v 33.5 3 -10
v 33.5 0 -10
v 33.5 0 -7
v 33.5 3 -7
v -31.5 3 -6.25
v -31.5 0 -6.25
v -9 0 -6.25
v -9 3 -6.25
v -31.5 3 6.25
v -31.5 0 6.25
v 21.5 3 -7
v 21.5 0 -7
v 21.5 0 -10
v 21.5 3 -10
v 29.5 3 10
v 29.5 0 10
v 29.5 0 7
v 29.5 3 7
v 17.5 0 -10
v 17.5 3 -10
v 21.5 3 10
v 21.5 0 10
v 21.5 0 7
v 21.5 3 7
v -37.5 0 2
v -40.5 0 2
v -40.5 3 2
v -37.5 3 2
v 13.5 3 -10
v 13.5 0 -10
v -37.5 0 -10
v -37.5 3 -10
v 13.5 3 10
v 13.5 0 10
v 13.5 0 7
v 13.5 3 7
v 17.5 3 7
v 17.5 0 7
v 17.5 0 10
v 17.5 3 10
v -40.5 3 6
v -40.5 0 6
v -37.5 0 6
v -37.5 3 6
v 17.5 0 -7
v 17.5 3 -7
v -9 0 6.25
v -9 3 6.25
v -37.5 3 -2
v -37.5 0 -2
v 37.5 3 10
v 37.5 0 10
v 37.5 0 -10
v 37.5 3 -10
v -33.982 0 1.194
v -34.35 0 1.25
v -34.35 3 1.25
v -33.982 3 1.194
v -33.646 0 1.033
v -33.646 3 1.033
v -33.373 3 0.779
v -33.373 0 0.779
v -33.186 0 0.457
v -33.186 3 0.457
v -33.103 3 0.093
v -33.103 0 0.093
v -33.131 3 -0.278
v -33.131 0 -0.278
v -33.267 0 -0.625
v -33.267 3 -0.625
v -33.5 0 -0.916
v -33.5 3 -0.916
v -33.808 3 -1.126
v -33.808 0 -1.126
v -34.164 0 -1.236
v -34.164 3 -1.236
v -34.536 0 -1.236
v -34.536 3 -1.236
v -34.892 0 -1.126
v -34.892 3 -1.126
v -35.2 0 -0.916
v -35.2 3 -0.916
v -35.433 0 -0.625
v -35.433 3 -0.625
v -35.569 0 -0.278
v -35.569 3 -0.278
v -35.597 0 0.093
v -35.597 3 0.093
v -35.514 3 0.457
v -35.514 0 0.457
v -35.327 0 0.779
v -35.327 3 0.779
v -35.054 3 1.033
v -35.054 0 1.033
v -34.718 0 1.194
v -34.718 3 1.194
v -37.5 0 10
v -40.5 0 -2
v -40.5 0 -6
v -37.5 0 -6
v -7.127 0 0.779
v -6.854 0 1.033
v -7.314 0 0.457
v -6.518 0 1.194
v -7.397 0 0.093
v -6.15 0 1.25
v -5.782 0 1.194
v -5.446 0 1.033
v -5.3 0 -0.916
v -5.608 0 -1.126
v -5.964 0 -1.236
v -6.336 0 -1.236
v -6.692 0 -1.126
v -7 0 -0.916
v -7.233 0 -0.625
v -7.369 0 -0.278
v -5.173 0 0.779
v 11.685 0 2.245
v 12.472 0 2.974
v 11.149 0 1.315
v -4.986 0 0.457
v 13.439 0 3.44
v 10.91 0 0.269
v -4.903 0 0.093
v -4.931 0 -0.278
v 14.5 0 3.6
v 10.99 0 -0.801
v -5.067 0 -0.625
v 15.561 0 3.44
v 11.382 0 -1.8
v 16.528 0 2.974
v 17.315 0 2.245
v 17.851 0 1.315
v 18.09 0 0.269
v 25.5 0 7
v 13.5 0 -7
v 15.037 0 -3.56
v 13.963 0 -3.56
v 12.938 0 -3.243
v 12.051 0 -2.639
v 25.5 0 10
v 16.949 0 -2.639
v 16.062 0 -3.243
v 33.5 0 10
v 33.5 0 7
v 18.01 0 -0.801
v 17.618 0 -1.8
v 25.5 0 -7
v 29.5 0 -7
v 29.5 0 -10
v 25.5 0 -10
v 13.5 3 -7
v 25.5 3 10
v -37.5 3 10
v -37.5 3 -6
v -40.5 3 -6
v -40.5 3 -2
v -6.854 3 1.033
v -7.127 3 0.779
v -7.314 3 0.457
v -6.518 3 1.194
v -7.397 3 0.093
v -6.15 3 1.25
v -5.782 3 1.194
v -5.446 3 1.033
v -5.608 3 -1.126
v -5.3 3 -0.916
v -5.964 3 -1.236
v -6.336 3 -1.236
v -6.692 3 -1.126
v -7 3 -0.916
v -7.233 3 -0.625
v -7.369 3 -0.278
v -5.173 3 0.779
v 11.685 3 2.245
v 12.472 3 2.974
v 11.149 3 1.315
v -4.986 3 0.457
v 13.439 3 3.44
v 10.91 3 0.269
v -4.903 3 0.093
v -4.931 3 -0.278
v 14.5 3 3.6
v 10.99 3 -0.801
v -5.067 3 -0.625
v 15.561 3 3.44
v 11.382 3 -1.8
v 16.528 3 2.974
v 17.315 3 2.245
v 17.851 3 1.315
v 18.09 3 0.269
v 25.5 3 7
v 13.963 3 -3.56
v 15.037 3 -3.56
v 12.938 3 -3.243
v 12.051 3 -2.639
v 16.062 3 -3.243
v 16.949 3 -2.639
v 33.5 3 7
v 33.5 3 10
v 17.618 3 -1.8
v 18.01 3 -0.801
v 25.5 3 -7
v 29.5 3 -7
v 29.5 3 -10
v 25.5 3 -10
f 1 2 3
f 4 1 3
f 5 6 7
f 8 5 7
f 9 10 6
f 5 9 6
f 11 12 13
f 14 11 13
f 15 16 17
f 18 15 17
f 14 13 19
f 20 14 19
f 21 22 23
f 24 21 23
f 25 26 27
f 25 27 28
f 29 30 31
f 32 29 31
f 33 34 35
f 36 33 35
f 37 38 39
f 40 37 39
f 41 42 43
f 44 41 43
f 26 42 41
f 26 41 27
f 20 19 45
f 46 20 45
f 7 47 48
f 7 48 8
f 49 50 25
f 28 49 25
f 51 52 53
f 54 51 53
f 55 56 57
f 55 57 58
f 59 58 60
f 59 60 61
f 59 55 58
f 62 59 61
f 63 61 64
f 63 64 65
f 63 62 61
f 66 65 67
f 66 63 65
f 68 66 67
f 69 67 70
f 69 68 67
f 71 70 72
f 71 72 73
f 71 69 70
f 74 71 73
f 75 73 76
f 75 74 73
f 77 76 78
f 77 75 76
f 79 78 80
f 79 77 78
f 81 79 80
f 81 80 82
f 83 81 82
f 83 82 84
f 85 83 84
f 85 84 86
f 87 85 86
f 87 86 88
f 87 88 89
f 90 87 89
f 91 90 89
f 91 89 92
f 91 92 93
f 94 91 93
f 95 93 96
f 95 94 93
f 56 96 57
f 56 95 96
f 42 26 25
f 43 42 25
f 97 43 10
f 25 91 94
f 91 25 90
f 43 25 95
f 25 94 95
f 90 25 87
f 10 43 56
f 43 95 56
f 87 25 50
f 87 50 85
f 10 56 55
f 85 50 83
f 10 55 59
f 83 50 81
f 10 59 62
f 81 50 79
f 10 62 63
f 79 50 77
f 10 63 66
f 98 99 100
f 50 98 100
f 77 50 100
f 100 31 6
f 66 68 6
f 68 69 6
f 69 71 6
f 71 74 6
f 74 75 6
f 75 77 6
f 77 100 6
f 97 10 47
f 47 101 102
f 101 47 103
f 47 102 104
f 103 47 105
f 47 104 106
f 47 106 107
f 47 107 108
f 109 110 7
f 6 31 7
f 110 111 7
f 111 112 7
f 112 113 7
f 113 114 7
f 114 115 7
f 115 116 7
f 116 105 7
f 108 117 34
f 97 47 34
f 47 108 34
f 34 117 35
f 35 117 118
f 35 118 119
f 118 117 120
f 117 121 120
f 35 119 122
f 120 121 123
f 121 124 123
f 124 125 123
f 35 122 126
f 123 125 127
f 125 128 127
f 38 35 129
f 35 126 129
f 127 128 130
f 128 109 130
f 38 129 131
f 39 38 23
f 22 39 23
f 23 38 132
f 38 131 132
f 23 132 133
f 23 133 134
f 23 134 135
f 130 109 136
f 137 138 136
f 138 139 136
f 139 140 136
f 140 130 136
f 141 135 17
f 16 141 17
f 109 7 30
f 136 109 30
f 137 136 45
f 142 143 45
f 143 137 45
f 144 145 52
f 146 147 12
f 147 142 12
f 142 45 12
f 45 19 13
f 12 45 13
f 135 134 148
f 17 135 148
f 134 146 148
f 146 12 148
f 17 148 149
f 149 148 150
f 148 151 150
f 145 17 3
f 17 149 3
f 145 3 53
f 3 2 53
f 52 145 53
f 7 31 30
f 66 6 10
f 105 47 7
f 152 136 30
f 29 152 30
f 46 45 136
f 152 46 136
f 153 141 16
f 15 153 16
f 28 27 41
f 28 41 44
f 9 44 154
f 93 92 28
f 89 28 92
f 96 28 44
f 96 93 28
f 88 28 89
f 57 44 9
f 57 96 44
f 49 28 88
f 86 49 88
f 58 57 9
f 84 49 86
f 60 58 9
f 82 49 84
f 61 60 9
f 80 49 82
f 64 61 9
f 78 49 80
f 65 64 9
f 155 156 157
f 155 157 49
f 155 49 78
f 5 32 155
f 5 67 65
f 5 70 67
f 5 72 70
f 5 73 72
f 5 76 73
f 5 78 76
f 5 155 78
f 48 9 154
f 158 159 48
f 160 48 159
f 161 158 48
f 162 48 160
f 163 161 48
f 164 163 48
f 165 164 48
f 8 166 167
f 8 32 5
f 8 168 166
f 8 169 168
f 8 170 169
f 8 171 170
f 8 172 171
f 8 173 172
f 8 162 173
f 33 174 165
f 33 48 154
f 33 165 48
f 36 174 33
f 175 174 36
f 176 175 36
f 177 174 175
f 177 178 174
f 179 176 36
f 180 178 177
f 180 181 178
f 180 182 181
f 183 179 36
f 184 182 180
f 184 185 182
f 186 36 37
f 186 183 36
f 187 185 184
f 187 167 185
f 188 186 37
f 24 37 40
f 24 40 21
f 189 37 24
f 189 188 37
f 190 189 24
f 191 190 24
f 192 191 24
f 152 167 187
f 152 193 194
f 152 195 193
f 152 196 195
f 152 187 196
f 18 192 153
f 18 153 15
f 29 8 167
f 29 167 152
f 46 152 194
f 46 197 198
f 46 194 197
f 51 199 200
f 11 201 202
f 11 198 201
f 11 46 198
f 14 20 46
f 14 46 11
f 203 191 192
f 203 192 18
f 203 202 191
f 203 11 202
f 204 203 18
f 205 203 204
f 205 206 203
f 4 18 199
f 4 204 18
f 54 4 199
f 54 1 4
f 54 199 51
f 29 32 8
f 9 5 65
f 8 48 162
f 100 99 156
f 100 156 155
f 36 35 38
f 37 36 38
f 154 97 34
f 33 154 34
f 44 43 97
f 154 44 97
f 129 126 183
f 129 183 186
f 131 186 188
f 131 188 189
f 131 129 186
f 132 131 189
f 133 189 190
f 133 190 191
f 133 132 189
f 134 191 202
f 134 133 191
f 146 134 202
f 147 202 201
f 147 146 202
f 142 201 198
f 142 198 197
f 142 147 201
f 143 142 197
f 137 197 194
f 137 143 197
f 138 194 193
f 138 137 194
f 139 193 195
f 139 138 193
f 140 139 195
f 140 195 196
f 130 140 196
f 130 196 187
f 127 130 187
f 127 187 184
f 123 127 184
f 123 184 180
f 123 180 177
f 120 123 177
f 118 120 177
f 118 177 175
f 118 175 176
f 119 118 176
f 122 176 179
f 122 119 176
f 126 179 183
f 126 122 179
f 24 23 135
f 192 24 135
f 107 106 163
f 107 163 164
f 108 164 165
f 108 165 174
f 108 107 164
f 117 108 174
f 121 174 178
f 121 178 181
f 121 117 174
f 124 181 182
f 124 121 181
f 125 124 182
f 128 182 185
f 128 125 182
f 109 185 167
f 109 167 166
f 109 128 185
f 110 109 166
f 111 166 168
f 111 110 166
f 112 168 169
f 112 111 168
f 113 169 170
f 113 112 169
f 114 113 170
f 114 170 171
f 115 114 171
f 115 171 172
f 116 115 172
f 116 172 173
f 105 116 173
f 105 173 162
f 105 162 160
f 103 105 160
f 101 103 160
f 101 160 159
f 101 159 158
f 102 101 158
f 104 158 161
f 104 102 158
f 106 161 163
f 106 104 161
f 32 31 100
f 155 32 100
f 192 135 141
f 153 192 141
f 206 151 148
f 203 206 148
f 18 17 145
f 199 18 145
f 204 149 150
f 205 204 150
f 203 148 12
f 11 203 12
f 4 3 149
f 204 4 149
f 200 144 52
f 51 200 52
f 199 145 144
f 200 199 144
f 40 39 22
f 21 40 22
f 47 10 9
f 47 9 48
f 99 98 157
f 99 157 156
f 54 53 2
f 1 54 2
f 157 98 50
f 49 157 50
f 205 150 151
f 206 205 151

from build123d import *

# Parameters (mm, degrees)
CROQUIS1_R              = 1.25
CROQUIS1_W              = 22.5
CROQUIS1_H              = 12.5
CROQUIS1_R_2            = 3.6
CROQUIS1_W_2            = 3
CROQUIS1_H_2            = 4
SALIENTE_EXTRUIR1_DEPTH = 3


with BuildPart() as part:
    # Croquis1 → Saliente-Extruir1 (new body)
    # profile 1 of 3: a face of its own
    with BuildSketch(Plane(origin=(0, 0, 0), x_dir=(1, 0, 0), z_dir=(0, 1, 0))):
        Polygon((-37.5, -6), (-37.5, -10), (13.5, -10), (13.5, -7), (17.5, -7), (17.5, -10), (21.5, -10), (21.5, -7), (25.5, -7), (25.5, -10), (29.5, -10), (29.5, -7), (33.5, -7), (33.5, -10), (37.5, -10), (37.5, 10), (33.5, 10), (33.5, 7), (29.5, 7), (29.5, 10), (25.5, 10), (25.5, 7), (21.5, 7), (21.5, 10), (17.5, 10), (17.5, 7), (13.5, 7), (13.5, 10), (-37.5, 10), (-37.5, 6), (-37.5, 2), (-37.5, -2), align=None)
        with Locations(Location((-34.35, 0, 0), (0, 0, 270))):
            Circle(CROQUIS1_R, mode=Mode.SUBTRACT)
        with Locations((-20.25, 0)):
            Rectangle(CROQUIS1_W, CROQUIS1_H, mode=Mode.SUBTRACT)
        with Locations(Location((-6.15, 0, 0), (0, 0, 270))):
            Circle(CROQUIS1_R, mode=Mode.SUBTRACT)
        with Locations(Location((14.5, 0, 0), (0, 0, 270))):
            Circle(CROQUIS1_R_2, mode=Mode.SUBTRACT)
    # profile 2 of 3: a face of its own
    with BuildSketch(Plane(origin=(0, 0, 0), x_dir=(1, 0, 0), z_dir=(0, 1, 0))):
        with Locations((-39, -4)):
            Rectangle(CROQUIS1_W_2, CROQUIS1_H_2)
    # profile 3 of 3: a face of its own
    with BuildSketch(Plane(origin=(0, 0, 0), x_dir=(1, 0, 0), z_dir=(0, 1, 0))):
        with Locations((-39, 4)):
            Rectangle(CROQUIS1_W_2, CROQUIS1_H_2)
    extrude(amount=SALIENTE_EXTRUIR1_DEPTH)


solid = part.part
